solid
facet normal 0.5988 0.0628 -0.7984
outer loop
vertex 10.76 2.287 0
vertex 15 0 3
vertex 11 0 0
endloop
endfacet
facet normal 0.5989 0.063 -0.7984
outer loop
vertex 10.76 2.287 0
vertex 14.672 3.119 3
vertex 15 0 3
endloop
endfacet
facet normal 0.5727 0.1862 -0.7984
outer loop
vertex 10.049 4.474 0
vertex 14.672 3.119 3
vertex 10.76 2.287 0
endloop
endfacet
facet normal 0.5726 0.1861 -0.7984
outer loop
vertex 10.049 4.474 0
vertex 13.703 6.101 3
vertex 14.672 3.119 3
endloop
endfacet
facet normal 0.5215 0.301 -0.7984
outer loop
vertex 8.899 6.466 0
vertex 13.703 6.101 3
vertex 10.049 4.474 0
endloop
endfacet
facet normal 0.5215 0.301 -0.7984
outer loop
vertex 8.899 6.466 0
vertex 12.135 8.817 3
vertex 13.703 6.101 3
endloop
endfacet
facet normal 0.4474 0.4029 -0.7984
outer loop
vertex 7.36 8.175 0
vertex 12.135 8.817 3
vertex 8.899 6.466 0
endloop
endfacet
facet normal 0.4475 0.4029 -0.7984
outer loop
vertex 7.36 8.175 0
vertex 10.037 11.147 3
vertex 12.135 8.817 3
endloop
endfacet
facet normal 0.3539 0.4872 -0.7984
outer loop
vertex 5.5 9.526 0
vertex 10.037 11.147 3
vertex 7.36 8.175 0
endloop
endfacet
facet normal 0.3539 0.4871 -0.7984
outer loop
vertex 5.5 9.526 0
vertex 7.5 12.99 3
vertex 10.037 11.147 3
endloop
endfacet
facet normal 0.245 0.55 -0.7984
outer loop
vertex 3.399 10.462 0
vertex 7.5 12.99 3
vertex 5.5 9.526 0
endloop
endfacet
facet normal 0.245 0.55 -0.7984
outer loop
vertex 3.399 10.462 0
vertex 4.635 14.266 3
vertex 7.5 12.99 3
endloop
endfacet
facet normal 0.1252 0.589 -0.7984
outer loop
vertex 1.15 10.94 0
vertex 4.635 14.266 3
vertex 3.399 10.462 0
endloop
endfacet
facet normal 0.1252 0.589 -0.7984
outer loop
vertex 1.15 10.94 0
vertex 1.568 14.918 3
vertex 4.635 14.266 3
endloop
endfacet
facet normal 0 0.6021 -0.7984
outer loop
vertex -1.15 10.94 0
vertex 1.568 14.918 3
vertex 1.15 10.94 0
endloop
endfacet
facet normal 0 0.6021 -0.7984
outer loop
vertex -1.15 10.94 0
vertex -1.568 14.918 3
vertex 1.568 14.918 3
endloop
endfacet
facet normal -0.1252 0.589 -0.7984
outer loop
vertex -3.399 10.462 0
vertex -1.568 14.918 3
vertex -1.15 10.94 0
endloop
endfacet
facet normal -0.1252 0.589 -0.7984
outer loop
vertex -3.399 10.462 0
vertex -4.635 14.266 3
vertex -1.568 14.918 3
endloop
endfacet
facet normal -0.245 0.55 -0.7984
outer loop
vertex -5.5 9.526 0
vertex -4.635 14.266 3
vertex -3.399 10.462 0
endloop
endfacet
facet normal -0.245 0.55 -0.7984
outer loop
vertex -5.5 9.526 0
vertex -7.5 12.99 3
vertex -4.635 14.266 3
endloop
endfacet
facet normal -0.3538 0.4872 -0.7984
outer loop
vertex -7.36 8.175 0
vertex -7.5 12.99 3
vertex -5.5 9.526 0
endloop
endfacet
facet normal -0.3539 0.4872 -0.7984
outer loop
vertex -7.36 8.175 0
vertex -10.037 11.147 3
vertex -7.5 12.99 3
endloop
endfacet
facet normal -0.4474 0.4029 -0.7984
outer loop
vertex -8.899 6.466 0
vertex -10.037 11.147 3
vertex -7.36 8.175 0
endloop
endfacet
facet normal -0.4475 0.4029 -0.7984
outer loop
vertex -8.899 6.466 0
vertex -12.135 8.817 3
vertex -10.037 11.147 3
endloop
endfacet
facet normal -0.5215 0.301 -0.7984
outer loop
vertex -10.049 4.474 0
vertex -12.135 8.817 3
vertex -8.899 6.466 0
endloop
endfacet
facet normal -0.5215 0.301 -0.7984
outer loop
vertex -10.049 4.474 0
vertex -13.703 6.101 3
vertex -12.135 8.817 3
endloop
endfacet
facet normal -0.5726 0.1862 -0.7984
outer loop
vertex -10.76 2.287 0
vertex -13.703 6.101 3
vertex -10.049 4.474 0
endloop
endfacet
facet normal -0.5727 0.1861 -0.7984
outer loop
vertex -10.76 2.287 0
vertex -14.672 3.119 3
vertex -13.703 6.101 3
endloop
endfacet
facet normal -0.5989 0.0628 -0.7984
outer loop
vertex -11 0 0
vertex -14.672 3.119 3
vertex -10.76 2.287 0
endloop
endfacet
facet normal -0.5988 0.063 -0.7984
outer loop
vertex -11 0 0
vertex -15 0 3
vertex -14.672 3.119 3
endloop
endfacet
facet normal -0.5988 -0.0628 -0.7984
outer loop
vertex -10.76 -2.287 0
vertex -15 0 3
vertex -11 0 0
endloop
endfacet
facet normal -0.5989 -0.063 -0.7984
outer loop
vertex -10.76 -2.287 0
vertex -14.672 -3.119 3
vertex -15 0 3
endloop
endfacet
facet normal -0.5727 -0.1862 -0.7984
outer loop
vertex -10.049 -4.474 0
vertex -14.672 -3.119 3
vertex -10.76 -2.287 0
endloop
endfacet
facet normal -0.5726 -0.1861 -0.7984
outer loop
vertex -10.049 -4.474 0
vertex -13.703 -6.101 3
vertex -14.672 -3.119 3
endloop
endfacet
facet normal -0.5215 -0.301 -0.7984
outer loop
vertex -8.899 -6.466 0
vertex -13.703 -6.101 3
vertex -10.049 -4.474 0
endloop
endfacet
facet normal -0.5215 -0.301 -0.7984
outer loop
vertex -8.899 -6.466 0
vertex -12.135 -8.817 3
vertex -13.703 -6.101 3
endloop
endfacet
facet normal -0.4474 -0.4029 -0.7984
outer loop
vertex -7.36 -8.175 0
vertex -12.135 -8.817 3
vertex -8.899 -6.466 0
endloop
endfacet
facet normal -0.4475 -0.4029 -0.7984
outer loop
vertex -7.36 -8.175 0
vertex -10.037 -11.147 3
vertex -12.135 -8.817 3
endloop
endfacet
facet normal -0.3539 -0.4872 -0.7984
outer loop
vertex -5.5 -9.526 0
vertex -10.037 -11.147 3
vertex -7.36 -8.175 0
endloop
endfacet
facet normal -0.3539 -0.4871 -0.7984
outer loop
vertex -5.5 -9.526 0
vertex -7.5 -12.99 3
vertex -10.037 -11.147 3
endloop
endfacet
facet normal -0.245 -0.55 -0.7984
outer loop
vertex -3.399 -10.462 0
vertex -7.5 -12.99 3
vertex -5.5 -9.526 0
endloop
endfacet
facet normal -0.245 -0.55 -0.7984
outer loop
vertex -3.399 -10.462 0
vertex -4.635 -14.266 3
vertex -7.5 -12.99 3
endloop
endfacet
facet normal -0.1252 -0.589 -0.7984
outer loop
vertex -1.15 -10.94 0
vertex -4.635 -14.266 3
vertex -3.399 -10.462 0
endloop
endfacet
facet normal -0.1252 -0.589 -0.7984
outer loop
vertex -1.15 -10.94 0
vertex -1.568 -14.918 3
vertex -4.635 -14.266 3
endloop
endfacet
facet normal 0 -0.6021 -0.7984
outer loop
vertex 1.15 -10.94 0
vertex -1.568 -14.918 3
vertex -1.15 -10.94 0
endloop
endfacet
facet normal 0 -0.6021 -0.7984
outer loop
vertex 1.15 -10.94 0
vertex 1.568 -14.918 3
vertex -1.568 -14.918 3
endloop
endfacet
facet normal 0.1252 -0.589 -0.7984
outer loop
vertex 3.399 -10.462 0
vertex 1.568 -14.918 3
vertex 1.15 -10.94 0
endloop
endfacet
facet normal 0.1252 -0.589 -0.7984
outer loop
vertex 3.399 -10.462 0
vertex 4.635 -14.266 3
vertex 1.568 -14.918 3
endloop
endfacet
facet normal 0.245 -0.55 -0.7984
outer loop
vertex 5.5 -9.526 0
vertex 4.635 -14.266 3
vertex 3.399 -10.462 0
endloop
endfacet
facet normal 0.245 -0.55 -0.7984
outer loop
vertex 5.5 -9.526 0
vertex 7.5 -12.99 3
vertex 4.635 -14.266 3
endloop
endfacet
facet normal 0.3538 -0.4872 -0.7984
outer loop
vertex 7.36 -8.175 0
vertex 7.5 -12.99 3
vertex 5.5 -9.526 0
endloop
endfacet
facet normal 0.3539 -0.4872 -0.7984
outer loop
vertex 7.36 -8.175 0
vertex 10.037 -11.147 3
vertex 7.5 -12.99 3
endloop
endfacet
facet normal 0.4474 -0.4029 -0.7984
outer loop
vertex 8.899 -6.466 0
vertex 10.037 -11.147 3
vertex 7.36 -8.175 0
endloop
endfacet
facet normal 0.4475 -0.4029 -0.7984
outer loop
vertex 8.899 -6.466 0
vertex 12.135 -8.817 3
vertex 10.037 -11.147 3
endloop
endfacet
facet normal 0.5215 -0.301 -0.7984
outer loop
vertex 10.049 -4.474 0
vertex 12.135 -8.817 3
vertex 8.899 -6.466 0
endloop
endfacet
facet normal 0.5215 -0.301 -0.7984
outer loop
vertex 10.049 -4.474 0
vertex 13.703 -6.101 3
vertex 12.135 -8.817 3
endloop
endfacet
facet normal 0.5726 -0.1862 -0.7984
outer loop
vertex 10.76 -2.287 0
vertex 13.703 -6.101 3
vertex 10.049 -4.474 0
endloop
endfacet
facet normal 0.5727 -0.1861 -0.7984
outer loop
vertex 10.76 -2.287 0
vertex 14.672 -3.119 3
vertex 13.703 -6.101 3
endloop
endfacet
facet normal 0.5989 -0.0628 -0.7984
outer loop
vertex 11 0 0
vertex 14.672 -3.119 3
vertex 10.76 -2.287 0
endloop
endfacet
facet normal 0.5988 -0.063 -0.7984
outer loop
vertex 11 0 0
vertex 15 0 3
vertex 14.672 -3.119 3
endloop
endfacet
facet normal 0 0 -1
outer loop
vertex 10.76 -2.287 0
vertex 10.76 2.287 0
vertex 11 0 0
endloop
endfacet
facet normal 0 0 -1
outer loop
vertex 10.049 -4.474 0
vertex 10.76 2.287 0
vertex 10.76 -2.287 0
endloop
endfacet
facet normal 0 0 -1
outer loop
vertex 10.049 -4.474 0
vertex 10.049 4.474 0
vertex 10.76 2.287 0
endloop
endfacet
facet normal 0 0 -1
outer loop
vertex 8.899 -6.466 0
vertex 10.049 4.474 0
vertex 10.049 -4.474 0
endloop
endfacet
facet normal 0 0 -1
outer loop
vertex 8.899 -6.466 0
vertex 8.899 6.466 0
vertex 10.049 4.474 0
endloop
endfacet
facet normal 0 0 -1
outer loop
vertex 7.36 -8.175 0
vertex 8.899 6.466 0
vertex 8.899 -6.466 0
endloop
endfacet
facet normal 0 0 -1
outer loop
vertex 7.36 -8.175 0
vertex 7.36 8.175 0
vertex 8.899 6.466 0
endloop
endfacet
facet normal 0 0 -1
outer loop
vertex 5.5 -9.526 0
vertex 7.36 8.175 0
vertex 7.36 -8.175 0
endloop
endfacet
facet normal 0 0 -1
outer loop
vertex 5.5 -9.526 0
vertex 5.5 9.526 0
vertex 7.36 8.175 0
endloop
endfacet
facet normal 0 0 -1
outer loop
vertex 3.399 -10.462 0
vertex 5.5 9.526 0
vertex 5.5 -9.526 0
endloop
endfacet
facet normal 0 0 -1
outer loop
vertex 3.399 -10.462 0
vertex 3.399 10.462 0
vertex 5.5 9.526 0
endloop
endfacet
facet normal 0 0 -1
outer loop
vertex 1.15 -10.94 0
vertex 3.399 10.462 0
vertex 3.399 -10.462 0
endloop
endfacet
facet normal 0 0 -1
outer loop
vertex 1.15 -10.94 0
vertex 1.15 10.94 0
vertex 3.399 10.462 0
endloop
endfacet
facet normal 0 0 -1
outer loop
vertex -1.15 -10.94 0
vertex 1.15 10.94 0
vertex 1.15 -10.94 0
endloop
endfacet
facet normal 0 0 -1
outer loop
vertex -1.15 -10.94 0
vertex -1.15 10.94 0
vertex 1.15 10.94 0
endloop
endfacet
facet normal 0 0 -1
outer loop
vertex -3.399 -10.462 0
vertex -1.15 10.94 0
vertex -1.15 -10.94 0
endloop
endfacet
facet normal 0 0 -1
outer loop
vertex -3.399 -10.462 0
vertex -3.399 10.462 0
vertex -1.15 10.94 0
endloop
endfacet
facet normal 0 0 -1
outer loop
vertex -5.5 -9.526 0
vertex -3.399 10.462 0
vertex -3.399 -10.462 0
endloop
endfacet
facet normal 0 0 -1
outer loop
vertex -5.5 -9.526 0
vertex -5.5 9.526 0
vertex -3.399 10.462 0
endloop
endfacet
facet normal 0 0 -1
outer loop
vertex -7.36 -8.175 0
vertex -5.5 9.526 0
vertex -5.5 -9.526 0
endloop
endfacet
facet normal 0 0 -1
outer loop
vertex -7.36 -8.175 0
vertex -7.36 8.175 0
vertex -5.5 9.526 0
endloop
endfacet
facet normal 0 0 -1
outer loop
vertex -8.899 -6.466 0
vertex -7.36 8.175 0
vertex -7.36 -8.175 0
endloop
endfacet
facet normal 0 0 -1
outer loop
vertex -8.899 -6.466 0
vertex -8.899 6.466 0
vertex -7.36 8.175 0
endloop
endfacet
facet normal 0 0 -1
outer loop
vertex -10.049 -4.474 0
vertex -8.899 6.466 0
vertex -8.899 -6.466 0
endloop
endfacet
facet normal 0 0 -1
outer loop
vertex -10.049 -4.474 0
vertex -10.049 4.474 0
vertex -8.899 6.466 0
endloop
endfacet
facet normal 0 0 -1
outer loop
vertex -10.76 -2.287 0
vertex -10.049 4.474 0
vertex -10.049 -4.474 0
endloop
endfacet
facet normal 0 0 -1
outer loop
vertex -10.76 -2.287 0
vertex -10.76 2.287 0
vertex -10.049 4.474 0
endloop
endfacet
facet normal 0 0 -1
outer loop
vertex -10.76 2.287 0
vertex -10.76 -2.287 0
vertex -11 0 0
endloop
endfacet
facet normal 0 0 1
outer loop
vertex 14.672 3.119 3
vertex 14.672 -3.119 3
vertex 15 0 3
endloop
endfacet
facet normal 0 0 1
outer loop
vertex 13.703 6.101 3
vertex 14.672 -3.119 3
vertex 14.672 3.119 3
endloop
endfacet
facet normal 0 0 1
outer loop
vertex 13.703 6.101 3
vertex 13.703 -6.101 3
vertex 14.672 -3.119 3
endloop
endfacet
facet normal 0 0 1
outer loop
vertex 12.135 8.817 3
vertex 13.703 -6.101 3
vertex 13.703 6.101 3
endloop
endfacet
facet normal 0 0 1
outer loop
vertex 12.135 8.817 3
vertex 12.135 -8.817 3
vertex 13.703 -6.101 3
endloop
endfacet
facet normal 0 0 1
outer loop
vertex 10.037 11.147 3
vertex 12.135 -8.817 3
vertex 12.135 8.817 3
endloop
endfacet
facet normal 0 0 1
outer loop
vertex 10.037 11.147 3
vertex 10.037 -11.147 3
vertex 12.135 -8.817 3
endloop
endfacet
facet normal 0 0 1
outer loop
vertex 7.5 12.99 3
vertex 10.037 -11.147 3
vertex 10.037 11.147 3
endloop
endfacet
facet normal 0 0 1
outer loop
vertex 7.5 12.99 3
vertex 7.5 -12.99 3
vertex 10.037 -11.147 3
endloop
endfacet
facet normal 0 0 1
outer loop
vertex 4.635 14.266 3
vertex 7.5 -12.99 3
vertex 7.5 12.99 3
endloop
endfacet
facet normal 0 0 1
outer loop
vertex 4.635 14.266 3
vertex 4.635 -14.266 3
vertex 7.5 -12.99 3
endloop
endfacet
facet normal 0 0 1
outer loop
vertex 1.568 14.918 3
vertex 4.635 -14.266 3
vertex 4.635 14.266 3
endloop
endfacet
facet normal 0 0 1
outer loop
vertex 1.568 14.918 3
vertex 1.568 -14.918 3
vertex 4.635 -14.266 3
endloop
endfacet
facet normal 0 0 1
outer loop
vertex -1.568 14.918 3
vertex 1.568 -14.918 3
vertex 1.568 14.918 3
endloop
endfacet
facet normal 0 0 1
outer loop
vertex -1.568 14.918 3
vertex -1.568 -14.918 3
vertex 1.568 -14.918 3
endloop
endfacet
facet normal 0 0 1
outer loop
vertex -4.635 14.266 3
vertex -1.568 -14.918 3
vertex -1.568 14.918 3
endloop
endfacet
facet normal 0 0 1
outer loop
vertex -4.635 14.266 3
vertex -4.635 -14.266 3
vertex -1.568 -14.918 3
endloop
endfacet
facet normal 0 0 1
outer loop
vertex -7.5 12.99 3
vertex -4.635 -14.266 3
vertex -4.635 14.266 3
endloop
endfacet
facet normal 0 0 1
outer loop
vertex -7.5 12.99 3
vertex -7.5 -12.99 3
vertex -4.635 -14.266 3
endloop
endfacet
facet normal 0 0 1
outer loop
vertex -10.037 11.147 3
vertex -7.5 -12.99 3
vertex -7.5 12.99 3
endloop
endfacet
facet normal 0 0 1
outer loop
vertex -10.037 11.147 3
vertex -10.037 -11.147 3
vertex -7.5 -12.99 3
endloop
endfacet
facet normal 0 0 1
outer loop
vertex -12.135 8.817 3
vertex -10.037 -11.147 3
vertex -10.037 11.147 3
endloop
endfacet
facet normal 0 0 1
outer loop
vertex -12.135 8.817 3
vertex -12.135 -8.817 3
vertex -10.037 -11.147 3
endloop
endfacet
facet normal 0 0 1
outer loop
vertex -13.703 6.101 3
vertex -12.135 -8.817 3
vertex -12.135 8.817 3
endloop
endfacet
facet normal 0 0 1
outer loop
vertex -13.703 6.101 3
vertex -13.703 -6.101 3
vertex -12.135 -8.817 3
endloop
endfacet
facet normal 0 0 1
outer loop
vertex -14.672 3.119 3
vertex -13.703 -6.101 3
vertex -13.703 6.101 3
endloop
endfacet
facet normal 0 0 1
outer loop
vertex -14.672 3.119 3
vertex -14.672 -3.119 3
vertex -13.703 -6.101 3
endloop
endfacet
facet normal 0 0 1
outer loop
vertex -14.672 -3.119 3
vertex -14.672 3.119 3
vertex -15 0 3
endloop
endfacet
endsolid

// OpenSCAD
// Generated by SolidPython 1.0.1 on 2020-07-29 00:02:42


cylinder(h = 3, r1 = 11, r2 = 15);
/***********************************************
*********      SolidPython code:      **********
************************************************
 
# import packages: SolidPython
from solid import *
from solid.utils import *
from itertools import chain, combinations


class Resize:

    def __init__(self, scad_file):
        self.scad_file = scad_file
        #self.scad_file = import_scad(scad_file)
        # cone/cylinder param:
        self.r1 = 0
        self.r2 = 0
        self.h = 0
        # rectangular prism param:
        self.w = 0
        self.l = 0
        # ellipse param:
        self.r = 0

    # import OpenScad code (file name corresponds to shape)


    # classify shape + parameters
    def assign(self, param1, param2, param3):
        if self.scad_file == 'cone.scad':
            self.r1 = param1
            self.r2 = param2
            self.h = param3
        elif self.scad_file == 'cylinder.scad':
            self.r1 = param1
            self.r2 = param2
            self.h = param3
        elif self.scad_file == 'rectangularPrism.scad':
            self.h = param1
            self.l = param2
            self.w = param3
        else:
            self.r = param1
            self.h = param2

    # resize parameters
    def iterate(self):
        x = range(3, 20, 2)
        i = 1
        if self.scad_file == 'cone.scad':
            tempList = list(combinations(x, 3))
            #print(tempList)
            for i in x:
                for j in range (3):
                    param1 = tempList[i][0]
                    param2 = tempList[i][1]
                    param3 = tempList[i][2]
                    filepath = 'produced_scad_files/' + 'cone' + str(param1) + '_' + str(param2) + '_' + str(param3) + '.scad'
                    scad_render_to_file(cylinder(h=param1, r1=param2, r2=param3), filepath)

        elif self.scad_file == 'cylinder.scad':
            tempList = list(combinations(x, 3))
            for i in x:
                for j in range(3):
                    param1 = tempList[i][0]
                    param2 = tempList[i][1]
                    param3 = tempList[i][2]
                    filepath = 'produced_scad_files/' + 'cylinder' + str(param1) + '_' + str(param2) + '_' + str(param3) + '.scad'
                    scad_render_to_file(cylinder(h=param1, r1=param2, r2=param3), filepath)

        elif self.scad_file == 'rectangularPrism.scad':
            tempList = list(combinations(x, 3))
            for i in x:
                for j in range(3):
                    param1 = tempList[i][0]
                    param2 = tempList[i][1]
                    param3 = tempList[i][2]
                    filepath = 'produced_scad_files/' + 'rectangularPrism' + str(param1) + '_' + str(param2) + '_' + str(
                        param3) + '.scad'
                    scad_render_to_file(cube(size=(param1, param2, param3)), filepath)

        else:
            tempList = list(combinations(x, 2))
            for i in x:
                for j in range(3):
                    param1 = tempList[i][0]
                    param2 = tempList[i][1]
                    filepath = 'produced_scad_files/' + 'ellipse' + str(param1) + '_' + str(param2) + '_' + '.scad'
                    scad_render_to_file(sphere(param1, param2), filepath)

    def render_to_scadfile(self):
        scad_render_to_file(scad, 'example.scad') 
 
************************************************/
